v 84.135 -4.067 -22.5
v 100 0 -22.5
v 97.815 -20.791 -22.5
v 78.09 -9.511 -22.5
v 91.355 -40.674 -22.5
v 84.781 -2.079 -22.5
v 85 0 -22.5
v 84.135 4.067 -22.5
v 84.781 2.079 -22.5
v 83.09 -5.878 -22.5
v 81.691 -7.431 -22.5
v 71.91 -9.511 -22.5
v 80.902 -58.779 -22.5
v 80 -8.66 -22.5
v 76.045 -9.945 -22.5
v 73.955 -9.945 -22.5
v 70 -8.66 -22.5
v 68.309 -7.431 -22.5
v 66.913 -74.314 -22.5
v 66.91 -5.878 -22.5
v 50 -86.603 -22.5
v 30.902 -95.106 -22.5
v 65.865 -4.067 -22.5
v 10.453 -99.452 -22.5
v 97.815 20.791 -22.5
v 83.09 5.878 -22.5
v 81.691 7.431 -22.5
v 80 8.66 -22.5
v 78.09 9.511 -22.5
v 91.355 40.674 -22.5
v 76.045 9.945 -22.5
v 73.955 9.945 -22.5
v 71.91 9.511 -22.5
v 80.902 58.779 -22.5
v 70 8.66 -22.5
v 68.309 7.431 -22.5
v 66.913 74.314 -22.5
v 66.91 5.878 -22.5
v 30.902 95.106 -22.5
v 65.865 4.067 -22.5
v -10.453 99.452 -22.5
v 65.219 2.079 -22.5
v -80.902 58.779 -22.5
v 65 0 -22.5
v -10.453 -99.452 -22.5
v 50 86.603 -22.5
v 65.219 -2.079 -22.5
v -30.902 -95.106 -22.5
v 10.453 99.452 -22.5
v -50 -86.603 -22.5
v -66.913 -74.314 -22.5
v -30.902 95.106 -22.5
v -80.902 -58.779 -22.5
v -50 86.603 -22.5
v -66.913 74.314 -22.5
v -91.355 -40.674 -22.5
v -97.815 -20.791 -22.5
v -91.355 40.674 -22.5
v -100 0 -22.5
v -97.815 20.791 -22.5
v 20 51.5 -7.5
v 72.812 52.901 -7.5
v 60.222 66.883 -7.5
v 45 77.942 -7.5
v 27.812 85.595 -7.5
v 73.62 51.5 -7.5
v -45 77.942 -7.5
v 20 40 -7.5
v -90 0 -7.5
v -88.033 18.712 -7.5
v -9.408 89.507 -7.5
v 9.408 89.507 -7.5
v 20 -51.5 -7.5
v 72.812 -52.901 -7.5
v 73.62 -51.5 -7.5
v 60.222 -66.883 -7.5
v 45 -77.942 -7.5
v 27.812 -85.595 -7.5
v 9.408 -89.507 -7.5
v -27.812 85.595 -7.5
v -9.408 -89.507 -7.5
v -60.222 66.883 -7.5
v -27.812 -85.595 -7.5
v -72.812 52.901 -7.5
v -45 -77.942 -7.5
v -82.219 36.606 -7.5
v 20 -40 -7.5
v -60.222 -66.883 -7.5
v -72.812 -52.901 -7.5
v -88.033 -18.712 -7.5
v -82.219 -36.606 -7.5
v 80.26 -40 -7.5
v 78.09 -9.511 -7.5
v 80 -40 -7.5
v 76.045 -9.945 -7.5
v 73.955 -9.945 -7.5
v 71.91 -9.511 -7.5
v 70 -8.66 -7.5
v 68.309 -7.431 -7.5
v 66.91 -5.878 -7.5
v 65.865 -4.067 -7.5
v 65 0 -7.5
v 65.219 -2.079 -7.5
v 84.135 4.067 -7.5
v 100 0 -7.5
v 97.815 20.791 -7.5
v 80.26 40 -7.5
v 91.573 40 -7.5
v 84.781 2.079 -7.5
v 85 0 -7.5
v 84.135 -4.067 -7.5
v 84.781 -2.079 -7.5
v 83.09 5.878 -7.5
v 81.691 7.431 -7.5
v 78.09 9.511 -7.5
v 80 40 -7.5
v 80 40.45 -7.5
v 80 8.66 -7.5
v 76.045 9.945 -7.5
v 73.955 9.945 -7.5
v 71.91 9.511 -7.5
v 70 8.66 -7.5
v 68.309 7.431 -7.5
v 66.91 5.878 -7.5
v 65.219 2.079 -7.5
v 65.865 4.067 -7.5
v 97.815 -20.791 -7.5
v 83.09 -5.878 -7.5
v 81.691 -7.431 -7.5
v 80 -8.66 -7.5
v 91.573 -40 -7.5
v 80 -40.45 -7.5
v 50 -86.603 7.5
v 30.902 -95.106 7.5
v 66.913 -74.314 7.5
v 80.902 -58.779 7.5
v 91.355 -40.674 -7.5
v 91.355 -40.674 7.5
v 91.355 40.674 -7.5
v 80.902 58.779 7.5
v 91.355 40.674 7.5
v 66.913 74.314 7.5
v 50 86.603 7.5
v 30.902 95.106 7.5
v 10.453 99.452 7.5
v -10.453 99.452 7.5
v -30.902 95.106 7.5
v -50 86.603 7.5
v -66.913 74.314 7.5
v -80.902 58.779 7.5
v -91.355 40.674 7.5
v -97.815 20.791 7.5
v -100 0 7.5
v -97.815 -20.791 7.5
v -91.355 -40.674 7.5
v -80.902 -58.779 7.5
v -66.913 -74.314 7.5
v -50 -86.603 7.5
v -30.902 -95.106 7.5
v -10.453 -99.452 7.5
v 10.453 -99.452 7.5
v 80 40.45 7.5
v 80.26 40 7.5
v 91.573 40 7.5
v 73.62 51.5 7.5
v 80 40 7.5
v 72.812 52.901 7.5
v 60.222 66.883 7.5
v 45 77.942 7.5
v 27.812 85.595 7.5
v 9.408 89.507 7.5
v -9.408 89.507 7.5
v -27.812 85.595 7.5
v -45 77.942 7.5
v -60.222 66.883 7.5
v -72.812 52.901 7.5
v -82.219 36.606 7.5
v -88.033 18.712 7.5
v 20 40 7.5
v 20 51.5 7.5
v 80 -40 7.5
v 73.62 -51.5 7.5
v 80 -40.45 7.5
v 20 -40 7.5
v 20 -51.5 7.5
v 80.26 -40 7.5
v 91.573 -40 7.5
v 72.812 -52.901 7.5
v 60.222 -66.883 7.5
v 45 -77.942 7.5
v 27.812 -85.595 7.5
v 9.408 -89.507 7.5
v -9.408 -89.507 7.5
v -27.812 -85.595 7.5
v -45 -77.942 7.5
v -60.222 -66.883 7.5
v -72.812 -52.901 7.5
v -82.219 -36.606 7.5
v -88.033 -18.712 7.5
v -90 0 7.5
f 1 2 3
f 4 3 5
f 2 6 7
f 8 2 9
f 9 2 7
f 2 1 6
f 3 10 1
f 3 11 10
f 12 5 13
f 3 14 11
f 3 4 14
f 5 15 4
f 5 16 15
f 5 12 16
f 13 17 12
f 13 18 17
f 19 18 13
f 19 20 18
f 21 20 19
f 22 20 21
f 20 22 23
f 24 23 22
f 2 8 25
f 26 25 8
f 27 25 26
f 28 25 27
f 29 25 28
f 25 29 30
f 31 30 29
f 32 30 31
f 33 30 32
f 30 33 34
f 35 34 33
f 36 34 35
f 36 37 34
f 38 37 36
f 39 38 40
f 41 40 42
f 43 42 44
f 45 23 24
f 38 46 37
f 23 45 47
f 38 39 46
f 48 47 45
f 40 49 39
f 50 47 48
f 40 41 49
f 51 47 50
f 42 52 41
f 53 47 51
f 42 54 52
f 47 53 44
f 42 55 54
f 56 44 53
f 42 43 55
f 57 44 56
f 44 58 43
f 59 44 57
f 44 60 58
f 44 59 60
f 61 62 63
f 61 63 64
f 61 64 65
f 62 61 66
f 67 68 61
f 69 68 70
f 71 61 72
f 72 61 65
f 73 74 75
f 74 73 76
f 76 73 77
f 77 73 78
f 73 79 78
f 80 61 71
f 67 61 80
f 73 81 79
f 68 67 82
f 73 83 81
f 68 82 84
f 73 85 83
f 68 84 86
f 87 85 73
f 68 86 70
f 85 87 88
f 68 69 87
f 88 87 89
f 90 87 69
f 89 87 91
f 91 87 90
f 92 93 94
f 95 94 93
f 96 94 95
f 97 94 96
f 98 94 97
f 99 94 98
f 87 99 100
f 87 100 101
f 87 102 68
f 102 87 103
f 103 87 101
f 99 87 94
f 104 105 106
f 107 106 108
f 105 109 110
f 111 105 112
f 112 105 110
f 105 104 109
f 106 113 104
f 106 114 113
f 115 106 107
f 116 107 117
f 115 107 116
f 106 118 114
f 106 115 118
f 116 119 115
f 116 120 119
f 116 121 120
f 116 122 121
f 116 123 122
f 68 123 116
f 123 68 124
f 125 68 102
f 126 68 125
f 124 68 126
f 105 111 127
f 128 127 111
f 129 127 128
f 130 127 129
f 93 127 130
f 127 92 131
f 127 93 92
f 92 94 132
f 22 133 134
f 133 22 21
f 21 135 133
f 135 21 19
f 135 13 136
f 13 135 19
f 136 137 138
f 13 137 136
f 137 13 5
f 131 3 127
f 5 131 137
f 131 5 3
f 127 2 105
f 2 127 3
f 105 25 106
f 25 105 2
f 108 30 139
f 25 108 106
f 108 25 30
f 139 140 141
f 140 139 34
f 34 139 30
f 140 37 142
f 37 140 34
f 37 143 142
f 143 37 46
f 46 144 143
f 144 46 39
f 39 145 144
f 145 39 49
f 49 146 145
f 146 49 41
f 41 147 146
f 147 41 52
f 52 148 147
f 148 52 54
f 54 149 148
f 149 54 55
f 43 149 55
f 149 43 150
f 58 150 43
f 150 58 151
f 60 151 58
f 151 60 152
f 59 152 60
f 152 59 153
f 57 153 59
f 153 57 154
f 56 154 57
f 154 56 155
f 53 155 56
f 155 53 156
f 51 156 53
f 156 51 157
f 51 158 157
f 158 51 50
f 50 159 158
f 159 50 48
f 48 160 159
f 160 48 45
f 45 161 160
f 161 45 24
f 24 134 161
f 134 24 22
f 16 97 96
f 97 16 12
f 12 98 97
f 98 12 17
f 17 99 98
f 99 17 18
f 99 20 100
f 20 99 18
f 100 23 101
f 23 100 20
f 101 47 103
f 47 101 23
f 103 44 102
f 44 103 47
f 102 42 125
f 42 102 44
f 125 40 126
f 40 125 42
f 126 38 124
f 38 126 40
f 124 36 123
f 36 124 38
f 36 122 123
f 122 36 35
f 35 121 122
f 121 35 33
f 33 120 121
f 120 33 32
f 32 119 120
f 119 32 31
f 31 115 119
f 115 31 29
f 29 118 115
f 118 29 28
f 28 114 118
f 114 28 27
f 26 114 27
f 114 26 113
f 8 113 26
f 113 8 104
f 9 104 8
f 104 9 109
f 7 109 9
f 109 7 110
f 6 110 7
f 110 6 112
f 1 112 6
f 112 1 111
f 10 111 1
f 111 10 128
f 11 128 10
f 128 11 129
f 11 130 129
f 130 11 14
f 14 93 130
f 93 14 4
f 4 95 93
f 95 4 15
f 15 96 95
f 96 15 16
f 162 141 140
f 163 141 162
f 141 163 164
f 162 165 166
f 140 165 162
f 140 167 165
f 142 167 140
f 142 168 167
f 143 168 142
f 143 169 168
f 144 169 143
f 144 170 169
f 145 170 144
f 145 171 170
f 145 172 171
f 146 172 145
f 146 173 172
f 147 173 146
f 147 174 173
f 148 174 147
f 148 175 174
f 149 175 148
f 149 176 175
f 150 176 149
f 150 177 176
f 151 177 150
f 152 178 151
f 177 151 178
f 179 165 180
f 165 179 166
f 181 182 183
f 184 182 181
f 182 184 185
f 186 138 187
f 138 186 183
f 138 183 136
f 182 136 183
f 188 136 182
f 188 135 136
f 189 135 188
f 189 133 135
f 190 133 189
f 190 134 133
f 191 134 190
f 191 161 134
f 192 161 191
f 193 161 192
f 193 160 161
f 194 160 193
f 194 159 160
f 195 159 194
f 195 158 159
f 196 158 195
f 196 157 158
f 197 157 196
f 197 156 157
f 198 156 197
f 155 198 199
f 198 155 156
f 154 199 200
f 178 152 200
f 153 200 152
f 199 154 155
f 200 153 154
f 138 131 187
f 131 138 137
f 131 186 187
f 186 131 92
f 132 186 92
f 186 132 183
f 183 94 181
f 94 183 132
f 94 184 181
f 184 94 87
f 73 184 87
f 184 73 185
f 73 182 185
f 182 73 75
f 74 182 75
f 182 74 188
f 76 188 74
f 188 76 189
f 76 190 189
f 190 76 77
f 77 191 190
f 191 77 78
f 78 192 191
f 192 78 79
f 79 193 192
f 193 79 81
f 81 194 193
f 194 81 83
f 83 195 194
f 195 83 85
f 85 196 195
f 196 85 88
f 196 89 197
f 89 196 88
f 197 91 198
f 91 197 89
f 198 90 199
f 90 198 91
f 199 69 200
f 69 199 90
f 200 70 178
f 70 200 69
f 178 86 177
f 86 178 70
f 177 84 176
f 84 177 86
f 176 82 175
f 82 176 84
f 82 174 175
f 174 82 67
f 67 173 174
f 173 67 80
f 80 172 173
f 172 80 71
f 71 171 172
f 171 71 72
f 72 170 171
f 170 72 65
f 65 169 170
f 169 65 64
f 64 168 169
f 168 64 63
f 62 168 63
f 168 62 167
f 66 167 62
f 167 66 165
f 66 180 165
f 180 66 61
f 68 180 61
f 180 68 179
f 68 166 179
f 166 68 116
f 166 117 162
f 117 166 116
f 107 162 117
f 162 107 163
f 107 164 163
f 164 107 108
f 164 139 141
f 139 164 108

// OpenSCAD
//Used "DeskEngrave" to create DXF files for texts
//using "IMPACT" font

module logo()
{	
color("BLUE")
		union() {
			translate([0,0,-15])
				linear_extrude(height=15,convexity = 5, center = true)
					difference() {
						circle(100);
						translate([75,00,0]) circle(10);
						}
	
linear_extrude(height=15,convexity = 5, center = true)
	union() {
		difference() {
			union() {
					difference() {
						circle(100);
						circle(90);
					}
			   	translate([20,-51.5,0]) square([60,103]);
			}
			translate([0,-40,0]) square([100,80]);
		}
		union() {
		translate([20,35,0])
			rotate([0,0,-90]) 
				scale([18,25,0])
					import(file = "PSTOIC.DXF", convexity = 12);
		translate([-40,51,0])
			rotate([0,0,-90])
				scale([40,40,0])
					import(file = "2015.DXF", convexity = 12);
		}
	}
}
}


logo();
